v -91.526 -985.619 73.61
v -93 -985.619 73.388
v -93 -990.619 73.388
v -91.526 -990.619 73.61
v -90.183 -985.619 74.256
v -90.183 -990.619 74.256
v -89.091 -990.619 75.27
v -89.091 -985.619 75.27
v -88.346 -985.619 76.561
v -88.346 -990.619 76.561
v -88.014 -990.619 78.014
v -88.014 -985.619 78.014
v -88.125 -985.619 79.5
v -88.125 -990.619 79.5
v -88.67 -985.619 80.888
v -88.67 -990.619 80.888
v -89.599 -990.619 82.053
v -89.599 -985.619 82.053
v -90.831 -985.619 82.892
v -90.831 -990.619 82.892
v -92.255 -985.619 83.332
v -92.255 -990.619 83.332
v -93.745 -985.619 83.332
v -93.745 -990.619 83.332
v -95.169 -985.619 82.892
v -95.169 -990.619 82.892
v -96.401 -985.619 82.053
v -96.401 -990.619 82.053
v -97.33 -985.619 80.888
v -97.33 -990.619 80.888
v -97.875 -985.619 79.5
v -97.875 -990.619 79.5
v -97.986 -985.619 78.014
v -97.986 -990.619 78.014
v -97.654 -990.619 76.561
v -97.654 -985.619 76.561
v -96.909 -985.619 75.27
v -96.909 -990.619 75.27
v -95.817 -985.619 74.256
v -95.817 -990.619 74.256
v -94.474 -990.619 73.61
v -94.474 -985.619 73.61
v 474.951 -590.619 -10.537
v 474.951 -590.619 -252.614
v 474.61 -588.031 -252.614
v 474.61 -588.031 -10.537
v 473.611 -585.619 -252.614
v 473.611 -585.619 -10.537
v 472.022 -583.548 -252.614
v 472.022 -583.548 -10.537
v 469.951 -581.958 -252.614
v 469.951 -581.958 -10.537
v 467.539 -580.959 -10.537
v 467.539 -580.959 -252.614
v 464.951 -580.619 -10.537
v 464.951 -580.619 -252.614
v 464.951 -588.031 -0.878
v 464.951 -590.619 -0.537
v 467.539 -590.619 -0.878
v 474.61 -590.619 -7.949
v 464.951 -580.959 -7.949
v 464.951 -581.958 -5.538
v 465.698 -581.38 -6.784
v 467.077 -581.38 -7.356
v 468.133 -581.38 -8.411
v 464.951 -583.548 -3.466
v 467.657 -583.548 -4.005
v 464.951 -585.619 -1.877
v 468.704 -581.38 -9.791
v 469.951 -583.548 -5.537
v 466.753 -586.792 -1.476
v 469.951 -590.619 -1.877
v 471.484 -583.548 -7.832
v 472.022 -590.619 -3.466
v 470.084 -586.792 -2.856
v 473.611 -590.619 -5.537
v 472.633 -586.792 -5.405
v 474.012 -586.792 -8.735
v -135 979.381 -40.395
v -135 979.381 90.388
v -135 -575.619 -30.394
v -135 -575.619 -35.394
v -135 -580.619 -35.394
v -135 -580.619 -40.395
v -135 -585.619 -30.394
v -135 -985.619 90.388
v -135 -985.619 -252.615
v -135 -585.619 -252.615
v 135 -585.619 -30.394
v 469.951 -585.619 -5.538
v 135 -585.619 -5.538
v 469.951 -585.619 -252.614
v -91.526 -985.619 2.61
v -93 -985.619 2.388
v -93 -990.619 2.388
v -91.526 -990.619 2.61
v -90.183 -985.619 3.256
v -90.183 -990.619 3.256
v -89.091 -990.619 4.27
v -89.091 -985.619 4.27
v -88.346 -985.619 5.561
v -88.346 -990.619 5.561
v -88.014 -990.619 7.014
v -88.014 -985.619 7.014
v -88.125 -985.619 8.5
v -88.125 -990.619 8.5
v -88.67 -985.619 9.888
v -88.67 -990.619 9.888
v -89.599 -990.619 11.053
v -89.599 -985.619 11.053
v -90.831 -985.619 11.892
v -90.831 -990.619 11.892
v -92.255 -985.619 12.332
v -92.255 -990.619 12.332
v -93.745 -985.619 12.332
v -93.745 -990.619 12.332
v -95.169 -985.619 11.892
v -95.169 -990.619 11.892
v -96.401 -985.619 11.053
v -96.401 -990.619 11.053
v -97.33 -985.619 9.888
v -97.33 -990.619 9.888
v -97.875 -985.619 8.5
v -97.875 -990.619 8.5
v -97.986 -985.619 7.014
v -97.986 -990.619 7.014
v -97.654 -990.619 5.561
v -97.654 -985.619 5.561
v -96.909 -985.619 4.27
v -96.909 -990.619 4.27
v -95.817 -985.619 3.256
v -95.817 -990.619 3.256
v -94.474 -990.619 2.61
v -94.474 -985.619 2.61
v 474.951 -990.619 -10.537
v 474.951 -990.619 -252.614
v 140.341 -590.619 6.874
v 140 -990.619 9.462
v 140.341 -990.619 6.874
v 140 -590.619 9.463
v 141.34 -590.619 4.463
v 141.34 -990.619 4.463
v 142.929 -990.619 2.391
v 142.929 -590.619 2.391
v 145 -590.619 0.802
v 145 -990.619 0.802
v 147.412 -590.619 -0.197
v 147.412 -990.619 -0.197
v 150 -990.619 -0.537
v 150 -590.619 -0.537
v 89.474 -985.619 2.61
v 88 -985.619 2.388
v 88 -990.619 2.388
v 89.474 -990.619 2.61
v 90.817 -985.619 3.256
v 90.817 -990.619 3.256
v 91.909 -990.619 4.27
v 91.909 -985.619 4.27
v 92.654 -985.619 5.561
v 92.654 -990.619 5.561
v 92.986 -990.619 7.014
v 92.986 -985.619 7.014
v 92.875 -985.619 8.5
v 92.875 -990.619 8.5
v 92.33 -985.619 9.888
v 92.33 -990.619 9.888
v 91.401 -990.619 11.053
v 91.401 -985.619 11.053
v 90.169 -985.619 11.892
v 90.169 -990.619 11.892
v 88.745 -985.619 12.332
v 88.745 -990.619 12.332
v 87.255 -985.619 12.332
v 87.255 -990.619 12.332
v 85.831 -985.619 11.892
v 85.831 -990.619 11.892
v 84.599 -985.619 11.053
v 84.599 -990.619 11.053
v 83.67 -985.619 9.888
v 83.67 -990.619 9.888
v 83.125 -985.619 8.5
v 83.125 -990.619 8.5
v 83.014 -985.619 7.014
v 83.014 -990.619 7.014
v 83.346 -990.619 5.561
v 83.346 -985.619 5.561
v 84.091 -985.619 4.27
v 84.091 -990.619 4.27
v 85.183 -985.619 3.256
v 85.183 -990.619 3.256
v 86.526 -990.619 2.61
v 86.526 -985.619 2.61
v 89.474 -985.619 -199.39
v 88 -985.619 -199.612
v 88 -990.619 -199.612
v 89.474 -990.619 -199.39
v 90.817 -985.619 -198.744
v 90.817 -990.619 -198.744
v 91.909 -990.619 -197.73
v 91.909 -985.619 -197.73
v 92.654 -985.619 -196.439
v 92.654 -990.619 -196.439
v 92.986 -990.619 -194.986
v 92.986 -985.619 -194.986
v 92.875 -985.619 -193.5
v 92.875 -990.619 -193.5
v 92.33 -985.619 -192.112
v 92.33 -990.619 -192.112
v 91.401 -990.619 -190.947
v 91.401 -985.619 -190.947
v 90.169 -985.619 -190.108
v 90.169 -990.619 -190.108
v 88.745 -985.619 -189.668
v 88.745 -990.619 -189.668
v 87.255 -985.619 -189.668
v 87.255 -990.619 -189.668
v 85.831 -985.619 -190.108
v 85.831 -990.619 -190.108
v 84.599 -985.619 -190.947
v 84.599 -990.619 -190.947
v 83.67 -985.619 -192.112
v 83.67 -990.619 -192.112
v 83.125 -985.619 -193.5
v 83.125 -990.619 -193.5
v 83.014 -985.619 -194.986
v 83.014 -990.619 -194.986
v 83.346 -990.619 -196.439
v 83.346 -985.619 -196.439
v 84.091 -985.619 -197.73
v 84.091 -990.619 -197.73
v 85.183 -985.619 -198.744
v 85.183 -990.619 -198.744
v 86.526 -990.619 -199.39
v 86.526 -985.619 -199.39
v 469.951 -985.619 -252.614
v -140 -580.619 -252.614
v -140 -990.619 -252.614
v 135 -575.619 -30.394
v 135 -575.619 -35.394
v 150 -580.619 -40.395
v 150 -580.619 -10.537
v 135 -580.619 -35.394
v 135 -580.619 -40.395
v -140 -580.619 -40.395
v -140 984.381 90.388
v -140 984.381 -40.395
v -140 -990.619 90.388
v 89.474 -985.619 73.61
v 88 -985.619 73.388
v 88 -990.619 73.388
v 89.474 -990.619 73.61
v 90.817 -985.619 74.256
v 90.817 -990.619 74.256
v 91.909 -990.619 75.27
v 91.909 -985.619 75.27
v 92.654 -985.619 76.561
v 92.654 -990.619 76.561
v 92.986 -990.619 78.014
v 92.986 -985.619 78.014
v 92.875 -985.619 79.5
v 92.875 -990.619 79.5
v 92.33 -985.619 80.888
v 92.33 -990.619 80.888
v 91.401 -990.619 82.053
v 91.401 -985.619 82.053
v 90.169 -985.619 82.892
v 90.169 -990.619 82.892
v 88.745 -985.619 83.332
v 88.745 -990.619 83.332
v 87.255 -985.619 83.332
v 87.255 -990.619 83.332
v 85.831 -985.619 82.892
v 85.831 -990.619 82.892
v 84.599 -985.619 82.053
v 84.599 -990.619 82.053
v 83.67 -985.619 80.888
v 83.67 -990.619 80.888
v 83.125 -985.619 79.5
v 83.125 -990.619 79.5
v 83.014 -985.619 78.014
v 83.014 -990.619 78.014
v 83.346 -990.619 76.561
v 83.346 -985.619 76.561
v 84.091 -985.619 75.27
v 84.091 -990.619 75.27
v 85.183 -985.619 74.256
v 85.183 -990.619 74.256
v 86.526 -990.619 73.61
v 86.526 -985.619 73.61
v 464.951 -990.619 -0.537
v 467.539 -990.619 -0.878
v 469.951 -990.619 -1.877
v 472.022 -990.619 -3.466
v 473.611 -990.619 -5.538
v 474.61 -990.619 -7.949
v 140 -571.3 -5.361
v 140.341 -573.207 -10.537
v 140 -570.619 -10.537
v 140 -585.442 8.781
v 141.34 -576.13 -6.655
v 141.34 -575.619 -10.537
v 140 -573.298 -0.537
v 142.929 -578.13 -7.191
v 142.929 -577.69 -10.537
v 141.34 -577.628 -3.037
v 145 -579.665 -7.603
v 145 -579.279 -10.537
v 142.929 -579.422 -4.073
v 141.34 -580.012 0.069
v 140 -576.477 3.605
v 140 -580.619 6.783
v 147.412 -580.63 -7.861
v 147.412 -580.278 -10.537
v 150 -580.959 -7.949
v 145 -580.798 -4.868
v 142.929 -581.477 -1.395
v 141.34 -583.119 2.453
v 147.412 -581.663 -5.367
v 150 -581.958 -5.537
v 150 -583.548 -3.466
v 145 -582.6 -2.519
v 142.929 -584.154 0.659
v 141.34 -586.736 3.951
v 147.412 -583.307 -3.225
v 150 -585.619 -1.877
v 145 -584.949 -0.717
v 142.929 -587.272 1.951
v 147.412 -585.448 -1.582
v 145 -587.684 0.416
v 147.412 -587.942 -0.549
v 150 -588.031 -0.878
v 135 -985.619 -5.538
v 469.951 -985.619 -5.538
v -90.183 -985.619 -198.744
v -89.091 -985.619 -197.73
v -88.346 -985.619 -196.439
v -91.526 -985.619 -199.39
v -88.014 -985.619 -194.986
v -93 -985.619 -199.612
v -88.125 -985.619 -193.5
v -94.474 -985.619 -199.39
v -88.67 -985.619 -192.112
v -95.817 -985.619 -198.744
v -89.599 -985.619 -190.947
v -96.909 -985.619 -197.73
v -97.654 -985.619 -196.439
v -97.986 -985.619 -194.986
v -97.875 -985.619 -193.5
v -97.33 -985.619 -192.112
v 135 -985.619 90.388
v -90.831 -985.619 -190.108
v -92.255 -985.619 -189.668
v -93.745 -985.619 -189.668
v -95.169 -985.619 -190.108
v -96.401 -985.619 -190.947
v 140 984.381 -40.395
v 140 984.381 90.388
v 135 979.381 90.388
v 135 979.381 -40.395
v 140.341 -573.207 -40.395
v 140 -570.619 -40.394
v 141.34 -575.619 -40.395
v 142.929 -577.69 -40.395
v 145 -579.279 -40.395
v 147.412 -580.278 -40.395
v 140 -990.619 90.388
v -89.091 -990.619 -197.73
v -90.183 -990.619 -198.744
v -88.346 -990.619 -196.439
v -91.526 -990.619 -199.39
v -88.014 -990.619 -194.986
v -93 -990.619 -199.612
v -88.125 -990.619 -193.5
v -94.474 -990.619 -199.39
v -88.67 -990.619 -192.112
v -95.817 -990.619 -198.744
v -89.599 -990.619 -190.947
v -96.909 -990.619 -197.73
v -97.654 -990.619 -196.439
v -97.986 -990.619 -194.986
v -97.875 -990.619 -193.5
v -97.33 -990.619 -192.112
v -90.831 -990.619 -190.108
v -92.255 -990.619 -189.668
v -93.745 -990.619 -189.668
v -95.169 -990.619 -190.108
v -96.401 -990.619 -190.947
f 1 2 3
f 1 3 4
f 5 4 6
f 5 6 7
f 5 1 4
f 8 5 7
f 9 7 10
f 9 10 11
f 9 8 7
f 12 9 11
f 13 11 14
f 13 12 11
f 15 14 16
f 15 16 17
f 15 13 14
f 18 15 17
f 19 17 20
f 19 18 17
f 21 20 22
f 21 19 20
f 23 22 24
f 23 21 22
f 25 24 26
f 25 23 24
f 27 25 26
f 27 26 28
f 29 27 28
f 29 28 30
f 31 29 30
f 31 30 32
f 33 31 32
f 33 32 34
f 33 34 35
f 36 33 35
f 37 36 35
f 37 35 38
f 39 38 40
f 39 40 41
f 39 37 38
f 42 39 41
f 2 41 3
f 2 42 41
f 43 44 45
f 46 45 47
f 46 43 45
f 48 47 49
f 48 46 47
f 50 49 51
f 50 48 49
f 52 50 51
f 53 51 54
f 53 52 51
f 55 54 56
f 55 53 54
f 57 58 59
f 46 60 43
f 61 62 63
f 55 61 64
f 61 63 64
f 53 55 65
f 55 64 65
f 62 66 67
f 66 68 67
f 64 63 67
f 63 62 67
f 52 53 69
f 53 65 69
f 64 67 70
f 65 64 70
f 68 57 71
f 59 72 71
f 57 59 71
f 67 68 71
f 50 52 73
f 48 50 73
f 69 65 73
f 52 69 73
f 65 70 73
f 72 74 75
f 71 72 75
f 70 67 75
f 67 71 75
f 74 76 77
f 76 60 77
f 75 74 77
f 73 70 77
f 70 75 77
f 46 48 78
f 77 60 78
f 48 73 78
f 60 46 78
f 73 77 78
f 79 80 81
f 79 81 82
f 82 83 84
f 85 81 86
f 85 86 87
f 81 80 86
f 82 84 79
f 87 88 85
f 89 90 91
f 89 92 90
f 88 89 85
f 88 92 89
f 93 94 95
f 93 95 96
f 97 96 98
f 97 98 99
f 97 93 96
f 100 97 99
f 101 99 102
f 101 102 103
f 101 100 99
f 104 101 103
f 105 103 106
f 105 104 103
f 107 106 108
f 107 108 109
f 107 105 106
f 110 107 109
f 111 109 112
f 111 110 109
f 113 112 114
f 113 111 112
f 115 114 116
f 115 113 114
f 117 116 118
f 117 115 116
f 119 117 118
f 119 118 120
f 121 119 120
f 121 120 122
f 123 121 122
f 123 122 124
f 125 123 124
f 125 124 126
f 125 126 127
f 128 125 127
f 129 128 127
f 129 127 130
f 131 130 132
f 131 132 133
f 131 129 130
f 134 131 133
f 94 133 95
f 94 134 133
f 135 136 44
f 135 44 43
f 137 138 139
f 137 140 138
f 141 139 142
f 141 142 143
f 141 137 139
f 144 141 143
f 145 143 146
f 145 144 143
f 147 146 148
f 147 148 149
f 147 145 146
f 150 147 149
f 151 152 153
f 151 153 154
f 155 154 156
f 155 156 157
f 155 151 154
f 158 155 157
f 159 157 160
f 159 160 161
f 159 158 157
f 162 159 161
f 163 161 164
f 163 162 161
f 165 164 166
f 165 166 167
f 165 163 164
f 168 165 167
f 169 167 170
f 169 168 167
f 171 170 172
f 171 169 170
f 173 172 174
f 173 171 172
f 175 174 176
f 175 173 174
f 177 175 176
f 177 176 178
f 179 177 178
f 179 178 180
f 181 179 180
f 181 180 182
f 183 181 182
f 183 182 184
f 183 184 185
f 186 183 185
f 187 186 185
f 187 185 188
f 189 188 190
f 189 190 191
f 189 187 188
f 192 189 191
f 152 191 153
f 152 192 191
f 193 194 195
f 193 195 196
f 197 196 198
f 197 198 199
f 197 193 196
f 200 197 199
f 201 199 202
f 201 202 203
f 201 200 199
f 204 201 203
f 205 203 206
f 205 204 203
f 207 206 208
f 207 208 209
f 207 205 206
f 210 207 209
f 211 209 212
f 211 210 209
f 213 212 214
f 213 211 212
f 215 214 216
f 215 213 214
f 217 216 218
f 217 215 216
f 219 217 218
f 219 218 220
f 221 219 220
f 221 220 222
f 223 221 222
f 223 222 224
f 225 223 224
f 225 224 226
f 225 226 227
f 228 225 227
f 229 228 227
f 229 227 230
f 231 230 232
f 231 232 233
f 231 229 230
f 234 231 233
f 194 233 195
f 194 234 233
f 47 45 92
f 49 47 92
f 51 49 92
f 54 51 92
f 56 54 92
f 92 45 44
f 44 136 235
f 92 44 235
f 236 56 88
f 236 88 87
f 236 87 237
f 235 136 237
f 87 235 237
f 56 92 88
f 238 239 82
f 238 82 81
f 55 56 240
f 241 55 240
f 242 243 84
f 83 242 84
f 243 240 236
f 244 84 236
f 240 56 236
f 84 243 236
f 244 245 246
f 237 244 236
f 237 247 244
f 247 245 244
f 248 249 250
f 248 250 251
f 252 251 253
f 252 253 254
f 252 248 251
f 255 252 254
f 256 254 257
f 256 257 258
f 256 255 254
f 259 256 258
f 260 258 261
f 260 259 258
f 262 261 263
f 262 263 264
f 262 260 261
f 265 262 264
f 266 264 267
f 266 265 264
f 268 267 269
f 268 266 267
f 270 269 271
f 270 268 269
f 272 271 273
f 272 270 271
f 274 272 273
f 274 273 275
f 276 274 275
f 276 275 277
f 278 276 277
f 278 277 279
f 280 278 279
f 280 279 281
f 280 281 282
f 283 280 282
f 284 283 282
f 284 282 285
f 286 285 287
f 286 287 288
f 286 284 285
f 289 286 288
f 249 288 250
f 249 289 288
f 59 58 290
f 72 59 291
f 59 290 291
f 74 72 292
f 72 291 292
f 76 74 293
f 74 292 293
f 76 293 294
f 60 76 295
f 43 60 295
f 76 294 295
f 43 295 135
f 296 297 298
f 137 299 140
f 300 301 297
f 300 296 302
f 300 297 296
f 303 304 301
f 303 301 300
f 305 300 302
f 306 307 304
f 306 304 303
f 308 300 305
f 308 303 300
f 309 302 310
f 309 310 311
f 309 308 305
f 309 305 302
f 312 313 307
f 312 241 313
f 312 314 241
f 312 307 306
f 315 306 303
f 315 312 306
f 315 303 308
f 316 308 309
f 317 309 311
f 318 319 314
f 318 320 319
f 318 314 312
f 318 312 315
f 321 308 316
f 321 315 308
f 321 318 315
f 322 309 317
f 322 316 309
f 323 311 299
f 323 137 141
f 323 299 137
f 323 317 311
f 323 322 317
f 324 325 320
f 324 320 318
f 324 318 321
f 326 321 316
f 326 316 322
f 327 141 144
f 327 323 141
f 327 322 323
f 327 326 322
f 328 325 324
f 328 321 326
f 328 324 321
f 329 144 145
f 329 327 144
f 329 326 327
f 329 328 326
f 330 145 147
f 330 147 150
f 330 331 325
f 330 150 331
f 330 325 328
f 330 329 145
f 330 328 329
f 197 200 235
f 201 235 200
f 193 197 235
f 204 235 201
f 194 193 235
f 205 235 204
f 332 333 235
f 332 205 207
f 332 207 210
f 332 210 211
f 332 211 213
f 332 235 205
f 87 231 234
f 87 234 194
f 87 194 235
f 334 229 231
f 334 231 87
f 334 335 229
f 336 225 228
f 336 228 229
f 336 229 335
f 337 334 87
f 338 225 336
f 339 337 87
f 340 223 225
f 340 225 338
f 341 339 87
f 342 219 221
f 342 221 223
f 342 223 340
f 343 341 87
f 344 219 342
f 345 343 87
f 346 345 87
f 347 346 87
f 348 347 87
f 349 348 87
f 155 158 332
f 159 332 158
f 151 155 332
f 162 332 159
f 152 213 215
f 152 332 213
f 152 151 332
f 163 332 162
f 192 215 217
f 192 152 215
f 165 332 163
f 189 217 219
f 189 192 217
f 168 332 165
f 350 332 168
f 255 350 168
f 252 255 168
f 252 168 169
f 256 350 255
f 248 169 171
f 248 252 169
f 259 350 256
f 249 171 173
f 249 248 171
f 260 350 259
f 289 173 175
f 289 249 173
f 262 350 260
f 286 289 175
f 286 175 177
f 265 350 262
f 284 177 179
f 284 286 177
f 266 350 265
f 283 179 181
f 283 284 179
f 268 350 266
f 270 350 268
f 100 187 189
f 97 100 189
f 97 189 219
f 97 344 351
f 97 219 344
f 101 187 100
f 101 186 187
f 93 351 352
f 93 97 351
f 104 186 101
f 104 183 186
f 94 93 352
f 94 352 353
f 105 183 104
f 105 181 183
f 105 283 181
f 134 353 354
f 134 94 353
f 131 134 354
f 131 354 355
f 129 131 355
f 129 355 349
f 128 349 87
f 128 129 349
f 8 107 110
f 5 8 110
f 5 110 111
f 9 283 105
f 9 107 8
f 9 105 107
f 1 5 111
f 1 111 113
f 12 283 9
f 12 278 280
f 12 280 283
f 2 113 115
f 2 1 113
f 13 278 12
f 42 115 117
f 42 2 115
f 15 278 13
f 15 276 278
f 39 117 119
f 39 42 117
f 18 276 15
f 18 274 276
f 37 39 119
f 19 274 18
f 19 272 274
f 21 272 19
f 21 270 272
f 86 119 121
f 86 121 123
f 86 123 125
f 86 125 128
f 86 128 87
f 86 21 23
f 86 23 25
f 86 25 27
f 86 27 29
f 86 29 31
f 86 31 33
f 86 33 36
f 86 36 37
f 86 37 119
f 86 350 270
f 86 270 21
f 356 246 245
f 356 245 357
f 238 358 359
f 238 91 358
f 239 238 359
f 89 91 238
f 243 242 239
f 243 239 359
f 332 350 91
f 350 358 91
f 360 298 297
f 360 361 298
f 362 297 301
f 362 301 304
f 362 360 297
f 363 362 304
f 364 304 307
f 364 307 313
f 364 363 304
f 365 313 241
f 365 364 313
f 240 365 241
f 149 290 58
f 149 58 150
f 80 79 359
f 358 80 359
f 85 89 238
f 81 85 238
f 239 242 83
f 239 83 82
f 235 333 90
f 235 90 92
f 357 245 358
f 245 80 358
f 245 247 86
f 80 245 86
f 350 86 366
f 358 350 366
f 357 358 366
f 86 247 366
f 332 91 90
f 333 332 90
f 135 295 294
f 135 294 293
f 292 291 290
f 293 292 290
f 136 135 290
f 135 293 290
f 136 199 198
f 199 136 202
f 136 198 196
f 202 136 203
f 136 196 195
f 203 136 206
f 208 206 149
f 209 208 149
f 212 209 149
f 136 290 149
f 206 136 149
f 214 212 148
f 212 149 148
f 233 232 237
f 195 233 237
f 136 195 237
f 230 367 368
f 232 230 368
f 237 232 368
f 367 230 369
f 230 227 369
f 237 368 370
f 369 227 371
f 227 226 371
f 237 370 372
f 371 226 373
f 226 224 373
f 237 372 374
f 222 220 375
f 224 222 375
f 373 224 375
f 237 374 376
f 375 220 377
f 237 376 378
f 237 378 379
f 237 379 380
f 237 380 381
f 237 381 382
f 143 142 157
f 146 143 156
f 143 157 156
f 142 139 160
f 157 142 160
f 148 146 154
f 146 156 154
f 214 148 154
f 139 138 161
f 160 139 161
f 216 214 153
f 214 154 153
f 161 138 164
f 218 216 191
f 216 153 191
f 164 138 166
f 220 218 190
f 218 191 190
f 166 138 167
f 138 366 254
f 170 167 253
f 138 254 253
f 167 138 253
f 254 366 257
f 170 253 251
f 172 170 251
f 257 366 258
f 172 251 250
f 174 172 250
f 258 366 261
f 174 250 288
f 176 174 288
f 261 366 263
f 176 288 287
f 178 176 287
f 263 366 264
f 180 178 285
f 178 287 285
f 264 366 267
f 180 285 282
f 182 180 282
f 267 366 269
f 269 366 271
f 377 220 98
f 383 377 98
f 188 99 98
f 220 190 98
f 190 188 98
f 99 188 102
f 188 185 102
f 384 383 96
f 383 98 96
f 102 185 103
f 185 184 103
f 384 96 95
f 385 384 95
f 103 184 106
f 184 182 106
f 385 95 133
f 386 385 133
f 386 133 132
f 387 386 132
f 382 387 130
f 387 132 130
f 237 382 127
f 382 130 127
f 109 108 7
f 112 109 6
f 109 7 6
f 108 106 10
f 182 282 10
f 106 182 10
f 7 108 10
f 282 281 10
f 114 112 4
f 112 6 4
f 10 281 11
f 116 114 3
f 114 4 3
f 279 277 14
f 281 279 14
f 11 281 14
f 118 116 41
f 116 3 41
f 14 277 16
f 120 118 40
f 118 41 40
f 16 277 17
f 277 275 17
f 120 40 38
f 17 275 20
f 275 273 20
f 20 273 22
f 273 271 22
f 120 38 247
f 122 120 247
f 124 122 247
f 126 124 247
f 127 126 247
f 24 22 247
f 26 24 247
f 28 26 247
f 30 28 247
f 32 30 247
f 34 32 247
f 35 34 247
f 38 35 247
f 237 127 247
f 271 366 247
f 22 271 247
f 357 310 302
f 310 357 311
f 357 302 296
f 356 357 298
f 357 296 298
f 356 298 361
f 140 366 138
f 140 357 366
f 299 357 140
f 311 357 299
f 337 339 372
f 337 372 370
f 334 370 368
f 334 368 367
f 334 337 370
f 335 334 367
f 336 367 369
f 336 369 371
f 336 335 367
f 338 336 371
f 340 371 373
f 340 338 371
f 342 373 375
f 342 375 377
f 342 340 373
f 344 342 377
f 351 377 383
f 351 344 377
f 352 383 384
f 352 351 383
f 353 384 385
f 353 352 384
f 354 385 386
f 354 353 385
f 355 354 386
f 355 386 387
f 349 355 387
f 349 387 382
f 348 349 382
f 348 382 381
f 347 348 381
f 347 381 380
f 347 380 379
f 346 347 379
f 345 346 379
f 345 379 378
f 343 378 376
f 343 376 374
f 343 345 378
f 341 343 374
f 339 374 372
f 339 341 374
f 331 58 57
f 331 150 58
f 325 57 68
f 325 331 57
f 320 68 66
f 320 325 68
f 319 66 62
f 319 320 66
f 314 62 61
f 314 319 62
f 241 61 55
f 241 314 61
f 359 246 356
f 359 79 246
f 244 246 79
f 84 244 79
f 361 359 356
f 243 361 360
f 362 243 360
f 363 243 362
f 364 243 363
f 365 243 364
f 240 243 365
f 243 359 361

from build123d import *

# Parameters (mm, degrees)
SKETCH3_R                      = 5
BOTTOM_PLATE_DEPTH             = 5
SKETCH4_W                      = 5
SKETCH4_H                      = 343.002
VERTICAL_WALLS_DEPTH           = 400
MID_HORIZONTAL_PLATE_DEPTH     = 5
SKETCH7_W                      = 5
SKETCH7_H                      = 130.782
REST_OF_VERTICAL_EXTRUDE_DEPTH = 1560
SKETCH8_W                      = 280
SKETCH8_H                      = 130.782
TOP_PLATE_DEPTH                = 5
MOTOR_BOX_FILLETS_R            = 10
SKETCH10_W                     = 5
SKETCH10_H                     = 10
BOTTOM_PLATE_LIP_DEPTH         = 270


with BuildPart() as part:
    # Sketch3 → Bottom plate (new body)
    with BuildSketch(Plane.XZ.offset(985.61875)):
        Polygon((-140, 90.3875), (140, 90.3875), (140, -0.5375), (474.951, -0.5375), (474.951, -252.6145), (-140, -252.6145), align=None)
        with Locations(Location((88, -194.6125, 0), (0, 0, 270))):
            Circle(SKETCH3_R, mode=Mode.SUBTRACT)
        with Locations(Location((-93, -194.6125, 0), (0, 0, 270))):
            Circle(SKETCH3_R, mode=Mode.SUBTRACT)
        with Locations(Location((88, 7.3875, 0), (0, 0, 270))):
            Circle(SKETCH3_R, mode=Mode.SUBTRACT)
        with Locations(Location((-93, 7.3875, 0), (0, 0, 270))):
            Circle(SKETCH3_R, mode=Mode.SUBTRACT)
        with Locations(Location((-93, 78.3875, 0), (0, 0, 270))):
            Circle(SKETCH3_R, mode=Mode.SUBTRACT)
        with Locations(Location((88, 78.3875, 0), (0, 0, 270))):
            Circle(SKETCH3_R, mode=Mode.SUBTRACT)
    extrude(amount=BOTTOM_PLATE_DEPTH)

    # Sketch4 → Vertical walls (add)
    with BuildSketch(Plane(origin=(0, -985.61875, 0), x_dir=(1, 0, 0), z_dir=(0, 1, 0))):
        with Locations((-137.5, 81.1135)):
            Rectangle(SKETCH4_W, SKETCH4_H)
        Polygon((135, -90.3875), (135, 5.5375), (469.951, 5.5375), (469.951, 252.6145), (474.951, 252.6145), (474.951, 0.5375), (140, 0.5375), (140, -90.3875), align=None)
    extrude(amount=VERTICAL_WALLS_DEPTH)

    # Sketch6 → Mid horizontal plate (add)
    with BuildSketch(Plane(origin=(0, -585.61875, 0), x_dir=(1, 0, 0), z_dir=(0, 1, 0))):
        Polygon((135, -90.3875), (135, 35.3945), (-135, 35.3945), (-135, -90.3875), (-140, -90.3875), (-140, 252.6145), (-135, 252.6145), (135, 252.6145), (474.951, 252.6145), (474.951, 0.5375), (140, 0.5375), (140, -90.3875), align=None)
    extrude(amount=MID_HORIZONTAL_PLATE_DEPTH)

    # Sketch7 → Rest of vertical extrude (add)
    with BuildSketch(Plane(origin=(0, -580.61875, 0), x_dir=(1, 0, 0), z_dir=(0, 1, 0))):
        with Locations((137.5, -24.9965)):
            Rectangle(SKETCH7_W, SKETCH7_H)
        with Locations((-137.5, -24.9965)):
            Rectangle(SKETCH7_W, SKETCH7_H)
    extrude(amount=REST_OF_VERTICAL_EXTRUDE_DEPTH)

    # Sketch8 → Top plate (add)
    with BuildSketch(Plane(origin=(0, 979.38125, 0), x_dir=(1, 0, 0), z_dir=(0, 1, 0))):
        with Locations((0, -24.9965)):
            Rectangle(SKETCH8_W, SKETCH8_H)
    extrude(amount=TOP_PLATE_DEPTH)

    # Motor box fillets
    motor_box_fillets_edges = [part.edges().sort_by_distance(p)[0] for p in [
        (140, -580.61875, -20.466),
        (140, -785.61875, -0.5375),
        (474.951, -785.61875, -0.5375),
        (307.4755, -580.61875, -0.5375),
        (474.951, -580.61875, -126.576),
    ]]
    fillet(motor_box_fillets_edges, radius=MOTOR_BOX_FILLETS_R)

    # Sketch10 → Bottom plate lip (add)
    with BuildSketch(Plane.ZY.offset(-135)):
        with Locations((-32.8945, -580.61875)):
            Rectangle(SKETCH10_W, SKETCH10_H)
    extrude(amount=BOTTOM_PLATE_LIP_DEPTH)


solid = part.part
